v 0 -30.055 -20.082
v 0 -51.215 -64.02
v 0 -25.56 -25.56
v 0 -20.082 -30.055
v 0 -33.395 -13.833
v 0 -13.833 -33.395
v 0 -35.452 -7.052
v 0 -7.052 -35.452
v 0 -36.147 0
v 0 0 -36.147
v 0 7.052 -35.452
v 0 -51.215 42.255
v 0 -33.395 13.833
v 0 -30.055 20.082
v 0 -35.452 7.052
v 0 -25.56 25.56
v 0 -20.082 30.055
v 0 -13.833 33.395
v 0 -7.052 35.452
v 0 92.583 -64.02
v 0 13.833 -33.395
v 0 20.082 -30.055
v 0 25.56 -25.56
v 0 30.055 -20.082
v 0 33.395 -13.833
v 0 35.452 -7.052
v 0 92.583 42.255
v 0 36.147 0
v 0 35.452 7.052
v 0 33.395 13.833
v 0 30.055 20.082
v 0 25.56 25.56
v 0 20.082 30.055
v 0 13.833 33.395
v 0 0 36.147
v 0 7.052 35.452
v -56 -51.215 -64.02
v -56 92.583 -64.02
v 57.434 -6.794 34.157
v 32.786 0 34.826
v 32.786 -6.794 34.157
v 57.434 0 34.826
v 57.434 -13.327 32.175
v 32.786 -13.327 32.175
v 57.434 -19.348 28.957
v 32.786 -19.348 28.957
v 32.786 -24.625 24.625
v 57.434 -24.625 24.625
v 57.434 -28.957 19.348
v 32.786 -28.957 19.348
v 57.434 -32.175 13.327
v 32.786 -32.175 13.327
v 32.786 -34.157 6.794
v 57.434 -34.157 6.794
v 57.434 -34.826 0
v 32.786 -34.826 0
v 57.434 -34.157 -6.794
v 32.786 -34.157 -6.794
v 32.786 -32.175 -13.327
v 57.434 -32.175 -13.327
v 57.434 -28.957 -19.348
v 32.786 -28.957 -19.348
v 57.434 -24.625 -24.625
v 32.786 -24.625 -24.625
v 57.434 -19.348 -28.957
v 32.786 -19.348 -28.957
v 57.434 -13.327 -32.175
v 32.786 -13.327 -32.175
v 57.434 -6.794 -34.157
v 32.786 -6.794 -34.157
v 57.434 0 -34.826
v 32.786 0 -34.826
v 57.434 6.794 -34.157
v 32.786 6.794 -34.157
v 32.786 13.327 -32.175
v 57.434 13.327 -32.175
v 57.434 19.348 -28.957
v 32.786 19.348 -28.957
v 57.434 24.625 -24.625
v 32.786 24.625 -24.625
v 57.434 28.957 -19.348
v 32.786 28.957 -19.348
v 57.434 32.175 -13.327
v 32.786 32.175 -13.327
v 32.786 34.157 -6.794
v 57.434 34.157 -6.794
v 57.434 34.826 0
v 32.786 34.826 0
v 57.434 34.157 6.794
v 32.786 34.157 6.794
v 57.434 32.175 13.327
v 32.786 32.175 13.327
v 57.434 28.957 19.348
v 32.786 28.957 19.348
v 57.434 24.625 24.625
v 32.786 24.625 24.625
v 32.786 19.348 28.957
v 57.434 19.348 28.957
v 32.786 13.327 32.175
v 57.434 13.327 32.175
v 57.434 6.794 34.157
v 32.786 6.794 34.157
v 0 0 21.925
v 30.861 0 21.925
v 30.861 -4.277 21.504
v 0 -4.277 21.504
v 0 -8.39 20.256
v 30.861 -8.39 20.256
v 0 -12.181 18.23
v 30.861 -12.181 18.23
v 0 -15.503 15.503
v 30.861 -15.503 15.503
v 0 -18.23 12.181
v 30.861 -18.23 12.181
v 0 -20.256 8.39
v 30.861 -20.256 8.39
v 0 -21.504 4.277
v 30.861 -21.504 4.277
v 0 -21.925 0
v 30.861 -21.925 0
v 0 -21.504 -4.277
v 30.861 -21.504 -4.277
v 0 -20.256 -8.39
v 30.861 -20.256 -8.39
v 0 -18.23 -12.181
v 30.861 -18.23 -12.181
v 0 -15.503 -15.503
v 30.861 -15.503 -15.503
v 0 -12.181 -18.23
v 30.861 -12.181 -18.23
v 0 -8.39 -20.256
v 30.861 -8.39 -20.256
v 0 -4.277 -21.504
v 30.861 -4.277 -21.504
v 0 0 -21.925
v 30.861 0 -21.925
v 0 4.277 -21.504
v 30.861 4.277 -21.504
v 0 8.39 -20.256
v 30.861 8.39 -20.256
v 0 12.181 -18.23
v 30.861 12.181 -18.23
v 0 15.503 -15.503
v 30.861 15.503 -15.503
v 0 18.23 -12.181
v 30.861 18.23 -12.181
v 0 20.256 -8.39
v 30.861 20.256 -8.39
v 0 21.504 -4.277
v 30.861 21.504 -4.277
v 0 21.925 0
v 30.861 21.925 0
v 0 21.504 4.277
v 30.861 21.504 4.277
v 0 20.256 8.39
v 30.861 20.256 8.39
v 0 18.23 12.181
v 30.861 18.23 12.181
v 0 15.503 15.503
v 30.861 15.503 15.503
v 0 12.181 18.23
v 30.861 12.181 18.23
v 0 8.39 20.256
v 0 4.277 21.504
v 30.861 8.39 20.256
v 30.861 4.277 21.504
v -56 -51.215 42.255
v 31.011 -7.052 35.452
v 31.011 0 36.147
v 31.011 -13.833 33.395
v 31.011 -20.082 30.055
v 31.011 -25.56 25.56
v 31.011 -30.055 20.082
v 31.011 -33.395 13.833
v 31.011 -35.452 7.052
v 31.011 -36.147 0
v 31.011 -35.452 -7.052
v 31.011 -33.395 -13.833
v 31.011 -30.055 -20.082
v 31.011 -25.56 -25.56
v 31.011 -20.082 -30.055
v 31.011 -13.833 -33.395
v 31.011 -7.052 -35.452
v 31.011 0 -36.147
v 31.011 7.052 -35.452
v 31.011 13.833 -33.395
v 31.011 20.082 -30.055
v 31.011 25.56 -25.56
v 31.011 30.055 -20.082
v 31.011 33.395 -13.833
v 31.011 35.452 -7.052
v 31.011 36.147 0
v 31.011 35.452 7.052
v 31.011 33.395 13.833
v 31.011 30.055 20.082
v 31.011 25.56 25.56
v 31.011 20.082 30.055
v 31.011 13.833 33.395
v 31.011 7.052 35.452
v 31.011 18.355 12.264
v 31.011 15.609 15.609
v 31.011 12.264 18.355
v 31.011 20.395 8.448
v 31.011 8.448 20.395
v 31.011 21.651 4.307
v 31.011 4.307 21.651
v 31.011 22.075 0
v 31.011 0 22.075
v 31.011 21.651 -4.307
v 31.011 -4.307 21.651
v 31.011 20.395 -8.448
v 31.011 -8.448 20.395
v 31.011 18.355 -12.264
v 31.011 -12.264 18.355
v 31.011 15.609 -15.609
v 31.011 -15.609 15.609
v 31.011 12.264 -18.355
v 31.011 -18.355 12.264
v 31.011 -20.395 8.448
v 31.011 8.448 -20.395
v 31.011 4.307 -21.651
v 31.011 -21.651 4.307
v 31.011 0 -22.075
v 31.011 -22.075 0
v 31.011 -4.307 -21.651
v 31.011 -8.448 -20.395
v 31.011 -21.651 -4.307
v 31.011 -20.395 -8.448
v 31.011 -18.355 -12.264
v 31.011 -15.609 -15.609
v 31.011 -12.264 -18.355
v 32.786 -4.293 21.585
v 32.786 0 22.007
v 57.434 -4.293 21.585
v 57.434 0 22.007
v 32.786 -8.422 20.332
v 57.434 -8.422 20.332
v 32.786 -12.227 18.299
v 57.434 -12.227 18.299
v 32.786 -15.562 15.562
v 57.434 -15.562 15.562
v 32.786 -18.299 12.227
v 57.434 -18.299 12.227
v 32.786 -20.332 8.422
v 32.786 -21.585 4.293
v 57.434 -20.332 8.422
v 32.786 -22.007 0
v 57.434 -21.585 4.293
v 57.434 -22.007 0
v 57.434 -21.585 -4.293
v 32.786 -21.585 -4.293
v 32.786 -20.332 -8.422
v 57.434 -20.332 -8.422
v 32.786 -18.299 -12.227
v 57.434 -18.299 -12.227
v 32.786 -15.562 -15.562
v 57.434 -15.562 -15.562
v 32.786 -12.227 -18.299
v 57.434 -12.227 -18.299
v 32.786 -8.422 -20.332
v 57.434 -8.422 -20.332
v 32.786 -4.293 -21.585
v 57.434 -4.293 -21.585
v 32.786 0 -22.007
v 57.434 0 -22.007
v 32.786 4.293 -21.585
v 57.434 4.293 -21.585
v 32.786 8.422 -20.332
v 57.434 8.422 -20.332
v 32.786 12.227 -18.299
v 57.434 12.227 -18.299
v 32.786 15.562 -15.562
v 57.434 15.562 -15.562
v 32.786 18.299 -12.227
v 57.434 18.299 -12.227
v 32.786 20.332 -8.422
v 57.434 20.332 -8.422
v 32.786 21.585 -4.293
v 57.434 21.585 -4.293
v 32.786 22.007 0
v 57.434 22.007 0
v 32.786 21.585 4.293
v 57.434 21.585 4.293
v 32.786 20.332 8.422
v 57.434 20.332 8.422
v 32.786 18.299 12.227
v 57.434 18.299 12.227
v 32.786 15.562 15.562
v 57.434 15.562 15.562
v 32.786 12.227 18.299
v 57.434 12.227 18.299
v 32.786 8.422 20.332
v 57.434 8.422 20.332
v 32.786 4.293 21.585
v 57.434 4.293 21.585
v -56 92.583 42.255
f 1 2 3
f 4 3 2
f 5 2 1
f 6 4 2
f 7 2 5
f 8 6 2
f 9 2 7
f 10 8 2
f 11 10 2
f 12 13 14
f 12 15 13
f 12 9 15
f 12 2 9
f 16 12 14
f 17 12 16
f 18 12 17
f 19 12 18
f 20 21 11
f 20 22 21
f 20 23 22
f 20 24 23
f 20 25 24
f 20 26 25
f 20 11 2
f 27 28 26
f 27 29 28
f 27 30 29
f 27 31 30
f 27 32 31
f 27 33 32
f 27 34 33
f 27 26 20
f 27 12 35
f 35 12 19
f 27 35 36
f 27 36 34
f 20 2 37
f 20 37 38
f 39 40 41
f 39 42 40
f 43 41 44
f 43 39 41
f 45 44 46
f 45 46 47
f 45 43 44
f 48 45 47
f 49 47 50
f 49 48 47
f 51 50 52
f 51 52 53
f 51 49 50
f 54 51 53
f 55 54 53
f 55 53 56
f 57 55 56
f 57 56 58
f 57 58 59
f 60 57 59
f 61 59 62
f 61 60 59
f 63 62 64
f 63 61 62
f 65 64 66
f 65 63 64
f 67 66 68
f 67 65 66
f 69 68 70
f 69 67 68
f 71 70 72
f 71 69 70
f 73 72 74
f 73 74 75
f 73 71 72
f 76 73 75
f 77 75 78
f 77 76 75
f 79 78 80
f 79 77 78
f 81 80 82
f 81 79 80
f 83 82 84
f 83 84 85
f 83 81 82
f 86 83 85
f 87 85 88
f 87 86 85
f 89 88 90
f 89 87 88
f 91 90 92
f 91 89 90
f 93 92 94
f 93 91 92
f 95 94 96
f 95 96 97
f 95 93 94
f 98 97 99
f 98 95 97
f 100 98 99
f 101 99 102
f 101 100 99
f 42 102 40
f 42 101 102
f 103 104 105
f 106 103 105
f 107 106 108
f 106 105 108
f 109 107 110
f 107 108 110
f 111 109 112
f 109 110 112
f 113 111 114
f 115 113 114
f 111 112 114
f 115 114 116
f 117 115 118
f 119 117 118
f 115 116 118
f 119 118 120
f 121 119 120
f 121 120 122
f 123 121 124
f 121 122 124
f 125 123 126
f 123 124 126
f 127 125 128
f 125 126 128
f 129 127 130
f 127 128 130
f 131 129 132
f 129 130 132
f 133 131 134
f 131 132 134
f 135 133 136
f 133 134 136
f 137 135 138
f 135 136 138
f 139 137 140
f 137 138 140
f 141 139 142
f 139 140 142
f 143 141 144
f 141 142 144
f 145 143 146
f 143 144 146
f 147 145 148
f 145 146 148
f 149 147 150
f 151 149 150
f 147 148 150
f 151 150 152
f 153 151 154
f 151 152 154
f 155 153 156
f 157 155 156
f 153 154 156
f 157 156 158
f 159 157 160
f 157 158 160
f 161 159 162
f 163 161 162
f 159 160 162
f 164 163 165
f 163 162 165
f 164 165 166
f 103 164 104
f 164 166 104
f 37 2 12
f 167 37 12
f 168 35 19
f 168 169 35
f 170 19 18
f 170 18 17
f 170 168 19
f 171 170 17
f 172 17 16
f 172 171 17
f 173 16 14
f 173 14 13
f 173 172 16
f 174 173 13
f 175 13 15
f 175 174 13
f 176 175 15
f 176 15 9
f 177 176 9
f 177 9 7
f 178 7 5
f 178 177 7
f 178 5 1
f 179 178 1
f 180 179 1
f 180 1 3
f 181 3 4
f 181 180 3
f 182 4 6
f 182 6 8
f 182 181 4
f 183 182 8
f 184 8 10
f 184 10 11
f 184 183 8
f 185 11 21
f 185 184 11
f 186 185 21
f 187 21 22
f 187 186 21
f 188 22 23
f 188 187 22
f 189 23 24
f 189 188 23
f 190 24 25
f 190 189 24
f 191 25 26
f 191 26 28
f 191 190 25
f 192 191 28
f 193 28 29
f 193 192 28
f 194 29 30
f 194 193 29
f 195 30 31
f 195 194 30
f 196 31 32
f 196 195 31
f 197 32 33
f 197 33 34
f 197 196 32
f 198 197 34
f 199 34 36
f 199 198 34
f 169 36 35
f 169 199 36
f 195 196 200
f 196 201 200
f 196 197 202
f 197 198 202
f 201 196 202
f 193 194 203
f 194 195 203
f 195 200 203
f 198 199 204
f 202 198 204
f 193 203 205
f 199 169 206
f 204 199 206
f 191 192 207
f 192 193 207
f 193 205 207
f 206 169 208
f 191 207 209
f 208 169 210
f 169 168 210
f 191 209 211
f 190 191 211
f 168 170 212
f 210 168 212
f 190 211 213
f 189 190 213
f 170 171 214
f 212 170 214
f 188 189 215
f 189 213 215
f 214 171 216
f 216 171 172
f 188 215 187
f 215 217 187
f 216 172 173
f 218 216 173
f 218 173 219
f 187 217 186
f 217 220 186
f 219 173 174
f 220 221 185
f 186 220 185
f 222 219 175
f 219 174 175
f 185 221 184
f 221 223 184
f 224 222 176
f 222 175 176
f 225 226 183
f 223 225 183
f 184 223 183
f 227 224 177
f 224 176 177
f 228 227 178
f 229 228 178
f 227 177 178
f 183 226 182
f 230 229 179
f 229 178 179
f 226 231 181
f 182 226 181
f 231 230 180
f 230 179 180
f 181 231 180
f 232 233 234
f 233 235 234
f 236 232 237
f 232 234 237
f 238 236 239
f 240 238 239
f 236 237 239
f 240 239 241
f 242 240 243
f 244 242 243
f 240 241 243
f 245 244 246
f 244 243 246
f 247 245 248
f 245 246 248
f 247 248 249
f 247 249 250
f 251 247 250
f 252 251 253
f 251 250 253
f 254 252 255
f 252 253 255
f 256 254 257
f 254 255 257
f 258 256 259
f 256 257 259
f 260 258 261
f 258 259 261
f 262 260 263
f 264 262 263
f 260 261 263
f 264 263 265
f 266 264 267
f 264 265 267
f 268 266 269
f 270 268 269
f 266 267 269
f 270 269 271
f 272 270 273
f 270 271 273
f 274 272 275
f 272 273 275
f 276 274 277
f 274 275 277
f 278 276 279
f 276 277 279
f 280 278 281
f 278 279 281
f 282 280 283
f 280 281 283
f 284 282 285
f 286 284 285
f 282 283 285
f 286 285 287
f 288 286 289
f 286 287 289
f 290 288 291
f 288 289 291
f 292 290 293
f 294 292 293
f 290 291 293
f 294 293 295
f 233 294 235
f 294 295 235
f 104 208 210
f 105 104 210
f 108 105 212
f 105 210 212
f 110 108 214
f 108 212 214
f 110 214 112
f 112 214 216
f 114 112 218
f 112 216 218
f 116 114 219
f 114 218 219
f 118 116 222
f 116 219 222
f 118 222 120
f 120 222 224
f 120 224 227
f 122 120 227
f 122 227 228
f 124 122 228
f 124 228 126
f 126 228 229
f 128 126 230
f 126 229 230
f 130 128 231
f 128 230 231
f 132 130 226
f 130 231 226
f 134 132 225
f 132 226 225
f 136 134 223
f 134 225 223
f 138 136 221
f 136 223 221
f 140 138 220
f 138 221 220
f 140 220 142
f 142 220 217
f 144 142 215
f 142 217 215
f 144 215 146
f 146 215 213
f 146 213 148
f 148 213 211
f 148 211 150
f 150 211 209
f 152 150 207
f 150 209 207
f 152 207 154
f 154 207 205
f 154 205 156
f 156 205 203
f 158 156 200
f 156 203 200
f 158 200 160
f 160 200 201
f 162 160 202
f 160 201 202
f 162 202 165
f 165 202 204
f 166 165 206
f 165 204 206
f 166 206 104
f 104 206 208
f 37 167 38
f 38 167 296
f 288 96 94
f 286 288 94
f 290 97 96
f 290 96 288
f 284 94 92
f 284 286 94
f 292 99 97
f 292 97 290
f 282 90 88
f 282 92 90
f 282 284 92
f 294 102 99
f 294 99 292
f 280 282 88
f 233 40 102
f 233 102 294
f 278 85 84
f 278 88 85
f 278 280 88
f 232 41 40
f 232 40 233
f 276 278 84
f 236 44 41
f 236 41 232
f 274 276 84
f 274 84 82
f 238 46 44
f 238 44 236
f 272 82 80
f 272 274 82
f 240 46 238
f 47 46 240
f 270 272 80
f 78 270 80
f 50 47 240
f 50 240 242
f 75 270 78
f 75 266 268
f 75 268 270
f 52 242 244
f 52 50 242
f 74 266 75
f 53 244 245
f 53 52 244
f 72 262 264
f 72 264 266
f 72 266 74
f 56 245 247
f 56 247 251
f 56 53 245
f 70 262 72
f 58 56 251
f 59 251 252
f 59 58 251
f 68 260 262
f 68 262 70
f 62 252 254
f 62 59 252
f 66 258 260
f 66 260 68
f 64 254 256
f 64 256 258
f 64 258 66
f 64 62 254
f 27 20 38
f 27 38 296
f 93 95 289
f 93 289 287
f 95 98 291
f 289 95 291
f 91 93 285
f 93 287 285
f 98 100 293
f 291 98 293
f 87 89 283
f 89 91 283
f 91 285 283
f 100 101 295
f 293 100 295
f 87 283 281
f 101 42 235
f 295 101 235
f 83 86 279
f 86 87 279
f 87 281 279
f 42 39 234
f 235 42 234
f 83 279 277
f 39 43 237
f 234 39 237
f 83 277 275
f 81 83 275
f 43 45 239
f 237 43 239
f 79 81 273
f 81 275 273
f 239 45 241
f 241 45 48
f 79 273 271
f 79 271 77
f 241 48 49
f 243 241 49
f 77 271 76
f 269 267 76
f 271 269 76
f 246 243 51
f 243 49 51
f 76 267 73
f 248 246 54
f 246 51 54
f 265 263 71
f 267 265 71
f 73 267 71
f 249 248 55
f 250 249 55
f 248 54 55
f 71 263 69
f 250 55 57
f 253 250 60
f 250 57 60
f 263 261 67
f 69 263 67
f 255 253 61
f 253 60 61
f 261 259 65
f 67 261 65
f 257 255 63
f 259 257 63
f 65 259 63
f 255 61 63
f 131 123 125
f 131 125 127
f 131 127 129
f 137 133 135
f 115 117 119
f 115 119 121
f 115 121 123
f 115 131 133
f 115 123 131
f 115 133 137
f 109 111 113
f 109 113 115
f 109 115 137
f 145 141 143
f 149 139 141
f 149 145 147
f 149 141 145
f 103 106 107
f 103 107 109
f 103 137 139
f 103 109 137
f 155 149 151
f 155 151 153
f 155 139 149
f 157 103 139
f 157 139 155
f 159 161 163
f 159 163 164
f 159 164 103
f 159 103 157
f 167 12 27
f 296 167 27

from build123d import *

# Parameters (mm, degrees)
F0_W     = 31.011032
F0_H     = 14.221618
F4_SIZE  = 0.15
F1_W     = 24.647661
F1_H     = 12.818201
F6_W     = 143.798173
F6_H     = 106.274911
F7_DEPTH = 56


with BuildPart() as f3:
    # F0 (on Front) → F3 (revolve)
    with BuildSketch(Plane.XZ):
        with Locations((15.505516, 29.035809)):
            Rectangle(F0_W, F0_H)
    revolve(axis=Axis((25.191288, 0, 0), (1, 0, 0)))

    # F4
    f4_edges = [f3.edges().sort_by_distance(p)[0] for p in [
        (31.011032, 0, -21.925),
    ]]
    chamfer(f4_edges, length=F4_SIZE)

    # F6 (on Right) → F7 (join)
    with BuildSketch(Plane.YZ):
        with Locations((20.68387, -10.882202)):
            Rectangle(F6_W, F6_H)
    extrude(amount=-F7_DEPTH)


with BuildPart() as f5:
    # F1 (on Front) → F5 (revolve)
    with BuildSketch(Plane.XZ):
        with Locations((45.110184, 28.4166)):
            Rectangle(F1_W, F1_H)
    revolve(axis=Axis((25.191288, 0, 0), (1, 0, 0)))


solid = Compound([f3.part, f5.part])
